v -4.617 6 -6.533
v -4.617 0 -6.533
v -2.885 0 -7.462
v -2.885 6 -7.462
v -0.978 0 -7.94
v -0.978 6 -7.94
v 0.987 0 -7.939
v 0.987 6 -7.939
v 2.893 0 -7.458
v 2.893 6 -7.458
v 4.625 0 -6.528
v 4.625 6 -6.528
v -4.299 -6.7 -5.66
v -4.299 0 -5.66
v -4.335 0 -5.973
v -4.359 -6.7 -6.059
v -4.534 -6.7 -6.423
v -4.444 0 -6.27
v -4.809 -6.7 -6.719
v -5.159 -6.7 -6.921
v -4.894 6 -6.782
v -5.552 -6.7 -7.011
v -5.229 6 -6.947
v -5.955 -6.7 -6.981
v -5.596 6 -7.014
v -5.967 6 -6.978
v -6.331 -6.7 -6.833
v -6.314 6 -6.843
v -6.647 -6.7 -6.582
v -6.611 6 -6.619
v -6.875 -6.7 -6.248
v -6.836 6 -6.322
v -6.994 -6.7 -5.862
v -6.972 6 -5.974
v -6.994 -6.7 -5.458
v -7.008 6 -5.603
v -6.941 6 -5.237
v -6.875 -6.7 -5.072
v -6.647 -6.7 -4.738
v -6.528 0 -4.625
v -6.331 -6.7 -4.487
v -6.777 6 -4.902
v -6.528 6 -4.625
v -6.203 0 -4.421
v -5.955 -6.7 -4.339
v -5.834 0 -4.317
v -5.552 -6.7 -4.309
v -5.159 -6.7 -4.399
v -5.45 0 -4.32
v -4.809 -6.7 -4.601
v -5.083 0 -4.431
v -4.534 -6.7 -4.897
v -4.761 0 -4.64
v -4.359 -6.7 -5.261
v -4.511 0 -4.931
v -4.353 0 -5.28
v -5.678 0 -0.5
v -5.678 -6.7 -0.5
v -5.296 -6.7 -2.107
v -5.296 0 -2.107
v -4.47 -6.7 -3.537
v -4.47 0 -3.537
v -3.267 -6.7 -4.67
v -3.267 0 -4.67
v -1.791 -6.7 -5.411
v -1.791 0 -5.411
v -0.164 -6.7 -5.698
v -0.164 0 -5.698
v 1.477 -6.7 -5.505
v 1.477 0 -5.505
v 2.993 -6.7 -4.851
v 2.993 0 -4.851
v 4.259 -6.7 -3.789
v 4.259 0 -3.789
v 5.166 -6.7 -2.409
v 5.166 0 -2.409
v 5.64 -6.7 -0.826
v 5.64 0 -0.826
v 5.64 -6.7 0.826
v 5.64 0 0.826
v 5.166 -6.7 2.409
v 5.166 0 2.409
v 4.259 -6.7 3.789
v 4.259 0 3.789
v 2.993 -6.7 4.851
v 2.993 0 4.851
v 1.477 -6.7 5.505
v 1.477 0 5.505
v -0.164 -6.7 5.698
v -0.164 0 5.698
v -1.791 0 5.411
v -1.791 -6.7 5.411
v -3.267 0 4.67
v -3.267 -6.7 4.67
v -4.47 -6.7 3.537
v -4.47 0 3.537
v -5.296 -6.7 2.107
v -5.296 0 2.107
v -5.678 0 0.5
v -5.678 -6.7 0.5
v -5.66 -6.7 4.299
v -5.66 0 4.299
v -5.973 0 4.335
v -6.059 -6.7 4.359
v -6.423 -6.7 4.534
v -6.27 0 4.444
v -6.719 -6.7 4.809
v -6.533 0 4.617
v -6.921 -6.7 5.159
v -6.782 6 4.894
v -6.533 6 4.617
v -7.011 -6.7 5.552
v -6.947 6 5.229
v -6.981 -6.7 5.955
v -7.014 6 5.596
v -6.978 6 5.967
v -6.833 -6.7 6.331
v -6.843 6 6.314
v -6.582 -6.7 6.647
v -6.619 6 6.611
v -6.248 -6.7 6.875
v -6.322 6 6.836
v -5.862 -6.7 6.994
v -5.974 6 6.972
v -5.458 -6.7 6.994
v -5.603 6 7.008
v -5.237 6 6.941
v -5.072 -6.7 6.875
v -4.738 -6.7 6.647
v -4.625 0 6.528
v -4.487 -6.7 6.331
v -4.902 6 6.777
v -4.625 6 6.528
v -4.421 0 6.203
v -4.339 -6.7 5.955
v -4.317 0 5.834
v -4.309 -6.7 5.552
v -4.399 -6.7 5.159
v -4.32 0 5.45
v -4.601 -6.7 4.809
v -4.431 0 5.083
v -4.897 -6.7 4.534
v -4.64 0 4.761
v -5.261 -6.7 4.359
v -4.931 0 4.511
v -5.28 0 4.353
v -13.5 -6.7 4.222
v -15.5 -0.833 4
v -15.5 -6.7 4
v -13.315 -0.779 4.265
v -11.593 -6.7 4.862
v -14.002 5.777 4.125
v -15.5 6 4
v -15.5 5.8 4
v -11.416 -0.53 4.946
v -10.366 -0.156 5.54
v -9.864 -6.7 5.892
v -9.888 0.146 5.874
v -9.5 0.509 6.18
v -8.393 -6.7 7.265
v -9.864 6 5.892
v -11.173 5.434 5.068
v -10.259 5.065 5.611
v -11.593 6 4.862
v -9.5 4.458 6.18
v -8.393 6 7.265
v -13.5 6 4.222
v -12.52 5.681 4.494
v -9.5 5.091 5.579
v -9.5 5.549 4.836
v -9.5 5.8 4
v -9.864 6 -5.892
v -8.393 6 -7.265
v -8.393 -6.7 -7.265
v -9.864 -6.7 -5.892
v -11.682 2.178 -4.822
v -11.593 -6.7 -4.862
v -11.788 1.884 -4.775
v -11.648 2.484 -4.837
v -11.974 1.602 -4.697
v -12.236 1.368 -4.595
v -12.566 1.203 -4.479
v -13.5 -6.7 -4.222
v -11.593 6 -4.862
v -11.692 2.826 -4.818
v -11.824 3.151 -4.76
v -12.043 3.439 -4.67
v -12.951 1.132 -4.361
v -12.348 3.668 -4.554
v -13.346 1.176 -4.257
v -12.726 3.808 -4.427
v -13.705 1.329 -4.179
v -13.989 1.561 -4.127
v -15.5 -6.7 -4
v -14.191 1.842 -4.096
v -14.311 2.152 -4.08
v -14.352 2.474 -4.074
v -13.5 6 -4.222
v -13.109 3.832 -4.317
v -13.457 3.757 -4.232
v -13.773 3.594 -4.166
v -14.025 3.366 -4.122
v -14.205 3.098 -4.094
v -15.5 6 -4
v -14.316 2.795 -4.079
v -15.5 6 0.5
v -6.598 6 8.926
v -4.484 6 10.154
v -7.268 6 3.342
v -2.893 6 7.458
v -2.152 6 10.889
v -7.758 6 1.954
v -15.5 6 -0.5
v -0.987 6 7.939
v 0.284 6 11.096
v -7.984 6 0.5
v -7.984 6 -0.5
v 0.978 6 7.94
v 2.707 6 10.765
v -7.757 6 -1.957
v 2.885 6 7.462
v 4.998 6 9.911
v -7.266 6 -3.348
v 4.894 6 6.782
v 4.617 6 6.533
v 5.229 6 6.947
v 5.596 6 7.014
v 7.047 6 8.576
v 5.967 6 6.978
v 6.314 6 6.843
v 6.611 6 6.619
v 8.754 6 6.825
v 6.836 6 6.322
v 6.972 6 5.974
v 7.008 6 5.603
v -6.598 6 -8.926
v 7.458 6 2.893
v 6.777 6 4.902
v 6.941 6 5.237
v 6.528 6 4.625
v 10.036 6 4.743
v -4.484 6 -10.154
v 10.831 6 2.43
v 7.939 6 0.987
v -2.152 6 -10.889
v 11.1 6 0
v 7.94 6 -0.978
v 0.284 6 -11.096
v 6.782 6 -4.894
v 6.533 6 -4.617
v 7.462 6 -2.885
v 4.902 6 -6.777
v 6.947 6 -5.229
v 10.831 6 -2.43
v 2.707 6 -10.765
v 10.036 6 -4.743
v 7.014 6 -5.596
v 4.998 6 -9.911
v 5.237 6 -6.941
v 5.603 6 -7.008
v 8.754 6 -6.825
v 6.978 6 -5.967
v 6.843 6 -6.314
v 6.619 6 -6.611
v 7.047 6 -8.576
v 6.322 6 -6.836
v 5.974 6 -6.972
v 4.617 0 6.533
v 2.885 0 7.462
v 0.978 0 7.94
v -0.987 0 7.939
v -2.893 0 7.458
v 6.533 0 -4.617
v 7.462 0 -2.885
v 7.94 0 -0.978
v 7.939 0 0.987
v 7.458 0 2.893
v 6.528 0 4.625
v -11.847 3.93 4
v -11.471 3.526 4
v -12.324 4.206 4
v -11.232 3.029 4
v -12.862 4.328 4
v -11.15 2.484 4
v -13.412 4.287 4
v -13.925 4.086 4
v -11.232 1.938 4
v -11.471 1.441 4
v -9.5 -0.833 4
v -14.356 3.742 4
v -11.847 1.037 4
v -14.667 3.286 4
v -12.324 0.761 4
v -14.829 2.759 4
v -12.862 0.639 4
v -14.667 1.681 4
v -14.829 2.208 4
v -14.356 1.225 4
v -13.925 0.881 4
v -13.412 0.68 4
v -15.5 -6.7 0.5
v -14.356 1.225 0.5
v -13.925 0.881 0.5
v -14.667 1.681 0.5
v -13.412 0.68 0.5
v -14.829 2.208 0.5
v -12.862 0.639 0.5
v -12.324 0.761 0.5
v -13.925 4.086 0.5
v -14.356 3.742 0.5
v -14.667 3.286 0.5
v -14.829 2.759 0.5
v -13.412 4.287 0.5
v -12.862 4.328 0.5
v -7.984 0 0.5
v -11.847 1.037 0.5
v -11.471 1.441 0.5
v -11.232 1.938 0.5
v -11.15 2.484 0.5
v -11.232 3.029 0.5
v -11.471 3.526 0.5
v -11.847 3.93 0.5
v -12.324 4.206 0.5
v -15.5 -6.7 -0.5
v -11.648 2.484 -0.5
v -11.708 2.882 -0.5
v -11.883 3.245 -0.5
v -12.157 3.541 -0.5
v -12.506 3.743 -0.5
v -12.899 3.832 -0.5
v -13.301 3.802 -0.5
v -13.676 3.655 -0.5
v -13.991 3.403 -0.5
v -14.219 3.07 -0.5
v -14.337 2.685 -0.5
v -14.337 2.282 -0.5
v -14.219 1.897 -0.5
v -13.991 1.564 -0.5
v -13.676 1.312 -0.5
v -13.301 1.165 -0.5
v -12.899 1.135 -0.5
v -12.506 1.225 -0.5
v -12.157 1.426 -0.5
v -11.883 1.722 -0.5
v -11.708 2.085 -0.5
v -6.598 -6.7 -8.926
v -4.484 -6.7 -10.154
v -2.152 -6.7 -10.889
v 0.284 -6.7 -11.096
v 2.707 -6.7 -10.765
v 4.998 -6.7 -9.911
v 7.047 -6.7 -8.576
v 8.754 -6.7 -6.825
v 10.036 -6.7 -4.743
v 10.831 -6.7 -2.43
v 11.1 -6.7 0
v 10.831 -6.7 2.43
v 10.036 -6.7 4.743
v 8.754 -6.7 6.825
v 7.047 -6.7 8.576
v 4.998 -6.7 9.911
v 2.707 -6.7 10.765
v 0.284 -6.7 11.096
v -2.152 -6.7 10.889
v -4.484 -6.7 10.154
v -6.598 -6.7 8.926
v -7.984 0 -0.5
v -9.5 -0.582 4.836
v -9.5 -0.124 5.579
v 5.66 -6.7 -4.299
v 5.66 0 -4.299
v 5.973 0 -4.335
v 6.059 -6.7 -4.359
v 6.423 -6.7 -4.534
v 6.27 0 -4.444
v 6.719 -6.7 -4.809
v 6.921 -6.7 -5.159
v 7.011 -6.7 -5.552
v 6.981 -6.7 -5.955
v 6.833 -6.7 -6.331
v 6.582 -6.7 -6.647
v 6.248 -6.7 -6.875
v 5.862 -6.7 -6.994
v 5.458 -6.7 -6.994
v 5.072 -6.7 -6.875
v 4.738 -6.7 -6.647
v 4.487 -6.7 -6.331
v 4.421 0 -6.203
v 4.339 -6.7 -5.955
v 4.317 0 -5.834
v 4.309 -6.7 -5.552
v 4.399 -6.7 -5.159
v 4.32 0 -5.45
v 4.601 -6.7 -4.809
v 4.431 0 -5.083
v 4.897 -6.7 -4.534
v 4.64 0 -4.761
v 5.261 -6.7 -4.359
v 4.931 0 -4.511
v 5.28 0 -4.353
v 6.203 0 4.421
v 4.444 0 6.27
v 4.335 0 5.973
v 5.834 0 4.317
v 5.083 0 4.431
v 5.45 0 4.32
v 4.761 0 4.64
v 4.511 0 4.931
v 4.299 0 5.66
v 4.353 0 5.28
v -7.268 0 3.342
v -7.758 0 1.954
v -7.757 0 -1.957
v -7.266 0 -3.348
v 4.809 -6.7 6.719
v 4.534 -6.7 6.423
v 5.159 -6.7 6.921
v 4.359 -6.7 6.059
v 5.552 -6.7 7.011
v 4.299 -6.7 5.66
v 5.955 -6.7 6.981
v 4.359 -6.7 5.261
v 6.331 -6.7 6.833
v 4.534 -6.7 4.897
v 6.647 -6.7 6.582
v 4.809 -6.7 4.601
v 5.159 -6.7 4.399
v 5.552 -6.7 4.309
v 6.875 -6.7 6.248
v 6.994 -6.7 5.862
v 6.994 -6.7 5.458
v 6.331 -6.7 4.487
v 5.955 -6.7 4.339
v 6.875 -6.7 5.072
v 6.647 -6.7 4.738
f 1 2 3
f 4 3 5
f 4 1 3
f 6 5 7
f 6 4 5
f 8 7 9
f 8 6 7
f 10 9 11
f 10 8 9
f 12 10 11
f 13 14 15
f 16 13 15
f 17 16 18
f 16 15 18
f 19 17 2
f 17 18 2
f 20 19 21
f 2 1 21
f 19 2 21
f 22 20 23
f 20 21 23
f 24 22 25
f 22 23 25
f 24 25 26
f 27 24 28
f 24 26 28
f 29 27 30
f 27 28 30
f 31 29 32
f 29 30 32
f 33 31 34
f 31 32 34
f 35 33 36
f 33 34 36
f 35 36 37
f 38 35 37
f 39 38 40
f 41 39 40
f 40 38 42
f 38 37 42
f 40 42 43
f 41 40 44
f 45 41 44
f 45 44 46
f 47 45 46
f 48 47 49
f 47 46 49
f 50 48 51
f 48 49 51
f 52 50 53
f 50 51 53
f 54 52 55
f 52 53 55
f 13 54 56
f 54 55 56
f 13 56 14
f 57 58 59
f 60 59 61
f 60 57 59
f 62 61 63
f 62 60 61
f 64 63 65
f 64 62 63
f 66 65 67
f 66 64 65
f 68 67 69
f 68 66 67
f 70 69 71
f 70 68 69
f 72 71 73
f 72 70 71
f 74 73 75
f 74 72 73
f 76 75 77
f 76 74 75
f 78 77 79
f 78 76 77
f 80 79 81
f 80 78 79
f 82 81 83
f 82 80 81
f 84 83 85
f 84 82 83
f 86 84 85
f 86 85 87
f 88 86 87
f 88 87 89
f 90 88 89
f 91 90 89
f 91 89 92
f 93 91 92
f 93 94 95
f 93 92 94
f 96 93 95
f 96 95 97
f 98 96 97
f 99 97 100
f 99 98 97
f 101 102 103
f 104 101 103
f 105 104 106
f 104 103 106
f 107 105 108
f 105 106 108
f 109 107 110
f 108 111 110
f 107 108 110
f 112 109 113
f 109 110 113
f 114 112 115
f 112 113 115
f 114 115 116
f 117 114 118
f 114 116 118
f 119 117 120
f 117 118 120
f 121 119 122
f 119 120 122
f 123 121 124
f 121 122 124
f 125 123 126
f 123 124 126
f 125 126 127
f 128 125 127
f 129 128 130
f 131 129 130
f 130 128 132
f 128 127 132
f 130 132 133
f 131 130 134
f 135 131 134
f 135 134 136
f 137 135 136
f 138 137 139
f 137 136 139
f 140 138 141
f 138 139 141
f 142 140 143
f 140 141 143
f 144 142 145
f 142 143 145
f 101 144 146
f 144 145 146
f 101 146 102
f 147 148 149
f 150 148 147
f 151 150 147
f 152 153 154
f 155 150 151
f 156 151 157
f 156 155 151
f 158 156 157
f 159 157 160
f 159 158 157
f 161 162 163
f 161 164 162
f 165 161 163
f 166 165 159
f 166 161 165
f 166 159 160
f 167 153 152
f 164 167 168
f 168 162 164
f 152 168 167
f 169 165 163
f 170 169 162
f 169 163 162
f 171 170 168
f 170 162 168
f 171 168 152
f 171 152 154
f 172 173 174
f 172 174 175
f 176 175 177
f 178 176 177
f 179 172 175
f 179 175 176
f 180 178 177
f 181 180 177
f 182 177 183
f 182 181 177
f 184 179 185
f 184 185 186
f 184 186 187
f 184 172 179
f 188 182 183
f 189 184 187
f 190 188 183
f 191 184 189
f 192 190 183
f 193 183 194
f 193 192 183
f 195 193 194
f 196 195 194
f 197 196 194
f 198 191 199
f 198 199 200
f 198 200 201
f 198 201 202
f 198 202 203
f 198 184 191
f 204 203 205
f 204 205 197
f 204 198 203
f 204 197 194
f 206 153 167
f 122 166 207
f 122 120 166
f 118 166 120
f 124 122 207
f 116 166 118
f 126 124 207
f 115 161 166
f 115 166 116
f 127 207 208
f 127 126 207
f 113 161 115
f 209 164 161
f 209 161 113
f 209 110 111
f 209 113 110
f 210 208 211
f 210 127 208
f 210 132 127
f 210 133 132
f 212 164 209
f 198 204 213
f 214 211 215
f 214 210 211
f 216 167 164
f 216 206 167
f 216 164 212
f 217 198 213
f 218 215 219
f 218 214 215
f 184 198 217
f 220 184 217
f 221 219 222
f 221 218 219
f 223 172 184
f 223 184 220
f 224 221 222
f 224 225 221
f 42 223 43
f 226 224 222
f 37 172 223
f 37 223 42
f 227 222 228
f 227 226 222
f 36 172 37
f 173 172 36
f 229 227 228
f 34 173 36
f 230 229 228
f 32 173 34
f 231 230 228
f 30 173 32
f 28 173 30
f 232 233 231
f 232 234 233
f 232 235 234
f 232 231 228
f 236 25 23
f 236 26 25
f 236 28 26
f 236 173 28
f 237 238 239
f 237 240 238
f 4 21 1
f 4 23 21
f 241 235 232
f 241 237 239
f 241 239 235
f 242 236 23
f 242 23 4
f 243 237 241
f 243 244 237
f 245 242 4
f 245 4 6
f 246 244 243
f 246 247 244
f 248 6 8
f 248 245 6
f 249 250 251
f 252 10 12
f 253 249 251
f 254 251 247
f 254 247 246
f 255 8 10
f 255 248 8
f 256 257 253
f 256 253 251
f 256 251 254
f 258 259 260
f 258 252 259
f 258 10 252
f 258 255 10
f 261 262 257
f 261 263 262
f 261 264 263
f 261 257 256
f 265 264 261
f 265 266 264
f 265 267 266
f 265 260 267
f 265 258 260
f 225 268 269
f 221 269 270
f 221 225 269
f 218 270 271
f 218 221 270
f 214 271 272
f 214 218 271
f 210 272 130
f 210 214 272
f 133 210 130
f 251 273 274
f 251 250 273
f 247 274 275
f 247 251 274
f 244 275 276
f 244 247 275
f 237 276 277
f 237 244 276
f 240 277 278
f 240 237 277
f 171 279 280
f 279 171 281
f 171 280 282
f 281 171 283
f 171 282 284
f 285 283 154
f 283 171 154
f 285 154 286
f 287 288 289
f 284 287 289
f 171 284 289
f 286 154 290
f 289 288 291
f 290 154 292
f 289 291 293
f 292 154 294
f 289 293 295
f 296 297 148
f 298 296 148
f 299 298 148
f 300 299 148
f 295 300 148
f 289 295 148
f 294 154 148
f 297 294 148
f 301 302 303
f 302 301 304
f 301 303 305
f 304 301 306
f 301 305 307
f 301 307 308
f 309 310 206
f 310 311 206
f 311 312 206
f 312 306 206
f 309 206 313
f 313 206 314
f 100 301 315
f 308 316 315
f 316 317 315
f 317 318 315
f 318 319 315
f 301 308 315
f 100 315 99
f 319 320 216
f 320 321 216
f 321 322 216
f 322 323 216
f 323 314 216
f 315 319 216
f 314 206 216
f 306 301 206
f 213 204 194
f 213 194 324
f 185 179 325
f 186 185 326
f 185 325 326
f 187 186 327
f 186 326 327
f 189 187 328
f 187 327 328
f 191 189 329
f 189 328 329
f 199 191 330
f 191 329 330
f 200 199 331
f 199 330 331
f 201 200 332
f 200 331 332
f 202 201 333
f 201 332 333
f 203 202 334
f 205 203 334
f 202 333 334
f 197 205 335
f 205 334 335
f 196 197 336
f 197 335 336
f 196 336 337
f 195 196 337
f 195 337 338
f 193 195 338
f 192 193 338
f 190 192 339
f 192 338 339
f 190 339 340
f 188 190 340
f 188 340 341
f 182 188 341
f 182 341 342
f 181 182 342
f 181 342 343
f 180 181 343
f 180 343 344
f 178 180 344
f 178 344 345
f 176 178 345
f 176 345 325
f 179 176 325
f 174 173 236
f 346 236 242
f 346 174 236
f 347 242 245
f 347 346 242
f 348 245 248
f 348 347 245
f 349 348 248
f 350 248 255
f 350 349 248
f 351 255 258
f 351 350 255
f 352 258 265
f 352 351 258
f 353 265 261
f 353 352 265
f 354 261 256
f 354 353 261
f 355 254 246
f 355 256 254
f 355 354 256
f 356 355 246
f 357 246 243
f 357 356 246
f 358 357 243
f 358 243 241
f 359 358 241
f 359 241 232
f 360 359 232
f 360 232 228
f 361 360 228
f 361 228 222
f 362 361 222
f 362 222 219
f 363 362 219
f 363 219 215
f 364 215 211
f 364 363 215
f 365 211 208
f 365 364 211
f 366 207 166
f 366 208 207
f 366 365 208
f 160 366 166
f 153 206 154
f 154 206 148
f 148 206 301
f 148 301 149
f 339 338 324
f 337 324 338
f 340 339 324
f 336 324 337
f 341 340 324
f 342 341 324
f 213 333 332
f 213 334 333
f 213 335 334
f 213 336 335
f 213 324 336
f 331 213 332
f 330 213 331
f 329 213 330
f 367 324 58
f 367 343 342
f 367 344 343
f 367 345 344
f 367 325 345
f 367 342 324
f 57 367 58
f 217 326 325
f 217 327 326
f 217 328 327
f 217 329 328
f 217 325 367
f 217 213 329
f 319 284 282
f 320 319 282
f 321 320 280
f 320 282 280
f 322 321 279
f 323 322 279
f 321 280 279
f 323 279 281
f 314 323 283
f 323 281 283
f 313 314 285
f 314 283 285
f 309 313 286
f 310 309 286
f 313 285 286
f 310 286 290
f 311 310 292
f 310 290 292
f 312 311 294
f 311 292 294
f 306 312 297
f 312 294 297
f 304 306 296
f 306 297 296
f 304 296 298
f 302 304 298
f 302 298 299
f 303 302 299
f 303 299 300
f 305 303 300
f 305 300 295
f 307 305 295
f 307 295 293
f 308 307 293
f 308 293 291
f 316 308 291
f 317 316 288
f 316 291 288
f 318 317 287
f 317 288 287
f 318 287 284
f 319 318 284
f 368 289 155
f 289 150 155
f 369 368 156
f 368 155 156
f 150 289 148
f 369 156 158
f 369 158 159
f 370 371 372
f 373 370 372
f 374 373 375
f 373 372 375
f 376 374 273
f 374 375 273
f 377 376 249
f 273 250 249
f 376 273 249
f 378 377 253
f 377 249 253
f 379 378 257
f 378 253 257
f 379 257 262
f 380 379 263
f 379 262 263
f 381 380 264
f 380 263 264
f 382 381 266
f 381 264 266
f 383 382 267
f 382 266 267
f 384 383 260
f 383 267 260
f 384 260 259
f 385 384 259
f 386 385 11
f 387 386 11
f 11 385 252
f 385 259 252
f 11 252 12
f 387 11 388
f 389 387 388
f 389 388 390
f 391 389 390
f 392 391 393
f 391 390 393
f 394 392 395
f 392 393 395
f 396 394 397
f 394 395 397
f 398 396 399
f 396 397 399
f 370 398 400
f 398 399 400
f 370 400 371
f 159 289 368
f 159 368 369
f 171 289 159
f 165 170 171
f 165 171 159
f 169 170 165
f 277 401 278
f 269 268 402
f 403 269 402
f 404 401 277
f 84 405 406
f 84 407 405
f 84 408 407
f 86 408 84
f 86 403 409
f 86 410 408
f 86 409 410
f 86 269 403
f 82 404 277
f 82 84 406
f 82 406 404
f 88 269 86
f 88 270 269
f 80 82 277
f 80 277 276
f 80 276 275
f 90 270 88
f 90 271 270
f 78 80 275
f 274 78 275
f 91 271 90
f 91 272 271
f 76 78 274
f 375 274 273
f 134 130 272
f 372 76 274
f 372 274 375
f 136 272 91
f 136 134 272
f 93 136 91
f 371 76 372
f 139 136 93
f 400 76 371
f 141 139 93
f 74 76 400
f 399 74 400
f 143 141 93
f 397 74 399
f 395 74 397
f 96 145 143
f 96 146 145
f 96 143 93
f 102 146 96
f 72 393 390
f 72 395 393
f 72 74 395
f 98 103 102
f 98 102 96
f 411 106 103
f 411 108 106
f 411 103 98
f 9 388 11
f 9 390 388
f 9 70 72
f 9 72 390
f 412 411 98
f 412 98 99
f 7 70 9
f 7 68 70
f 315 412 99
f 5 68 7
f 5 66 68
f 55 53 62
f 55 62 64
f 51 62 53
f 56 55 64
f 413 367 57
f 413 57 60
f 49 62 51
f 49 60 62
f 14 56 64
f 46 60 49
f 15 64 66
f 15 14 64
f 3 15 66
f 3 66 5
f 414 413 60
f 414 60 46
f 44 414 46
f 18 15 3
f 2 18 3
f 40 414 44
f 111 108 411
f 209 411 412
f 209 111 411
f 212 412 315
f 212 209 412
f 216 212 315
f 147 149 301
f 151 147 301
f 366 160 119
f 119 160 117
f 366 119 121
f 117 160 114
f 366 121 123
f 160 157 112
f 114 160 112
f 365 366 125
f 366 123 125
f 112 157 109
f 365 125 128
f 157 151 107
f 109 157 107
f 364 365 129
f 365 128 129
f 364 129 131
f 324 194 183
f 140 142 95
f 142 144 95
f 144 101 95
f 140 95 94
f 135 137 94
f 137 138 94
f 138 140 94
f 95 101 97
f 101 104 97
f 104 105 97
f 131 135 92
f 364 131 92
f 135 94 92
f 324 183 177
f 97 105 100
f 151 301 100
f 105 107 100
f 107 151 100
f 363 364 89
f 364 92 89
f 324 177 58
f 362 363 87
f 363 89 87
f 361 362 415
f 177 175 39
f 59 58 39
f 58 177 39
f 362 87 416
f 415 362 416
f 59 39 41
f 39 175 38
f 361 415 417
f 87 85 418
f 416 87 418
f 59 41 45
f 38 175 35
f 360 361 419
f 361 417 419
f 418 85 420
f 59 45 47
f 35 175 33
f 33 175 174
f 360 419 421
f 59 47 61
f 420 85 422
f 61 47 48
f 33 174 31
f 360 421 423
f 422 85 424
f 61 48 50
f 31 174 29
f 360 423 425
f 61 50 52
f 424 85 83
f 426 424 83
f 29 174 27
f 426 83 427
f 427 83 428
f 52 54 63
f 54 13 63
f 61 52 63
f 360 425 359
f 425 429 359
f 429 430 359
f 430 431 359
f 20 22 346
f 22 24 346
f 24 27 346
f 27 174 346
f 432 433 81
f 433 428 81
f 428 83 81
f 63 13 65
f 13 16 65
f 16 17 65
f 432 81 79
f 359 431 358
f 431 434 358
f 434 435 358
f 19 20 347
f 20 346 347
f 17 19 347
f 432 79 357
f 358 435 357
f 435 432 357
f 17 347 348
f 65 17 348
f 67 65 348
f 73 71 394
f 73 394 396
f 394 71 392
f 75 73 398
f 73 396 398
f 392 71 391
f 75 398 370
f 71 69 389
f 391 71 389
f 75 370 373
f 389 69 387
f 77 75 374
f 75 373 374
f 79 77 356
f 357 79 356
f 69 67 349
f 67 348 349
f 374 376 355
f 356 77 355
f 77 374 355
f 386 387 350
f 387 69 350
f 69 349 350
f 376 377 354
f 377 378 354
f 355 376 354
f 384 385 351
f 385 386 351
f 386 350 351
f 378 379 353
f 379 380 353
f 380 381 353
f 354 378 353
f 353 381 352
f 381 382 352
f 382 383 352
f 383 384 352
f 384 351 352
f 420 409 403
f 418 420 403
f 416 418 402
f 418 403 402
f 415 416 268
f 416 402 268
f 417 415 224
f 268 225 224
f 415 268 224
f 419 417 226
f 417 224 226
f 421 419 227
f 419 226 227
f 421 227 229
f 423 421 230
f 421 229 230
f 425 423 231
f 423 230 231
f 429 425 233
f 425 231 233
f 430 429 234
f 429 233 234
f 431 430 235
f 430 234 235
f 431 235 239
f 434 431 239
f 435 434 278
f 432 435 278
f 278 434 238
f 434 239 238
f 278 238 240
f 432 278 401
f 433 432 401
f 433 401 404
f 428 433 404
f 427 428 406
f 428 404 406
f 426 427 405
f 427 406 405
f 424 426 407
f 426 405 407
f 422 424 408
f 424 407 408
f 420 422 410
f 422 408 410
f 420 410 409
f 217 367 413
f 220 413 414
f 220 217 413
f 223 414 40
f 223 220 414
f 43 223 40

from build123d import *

# Parameters (mm, degrees)
SKETCH2_R          = 1.355
CUT_EXTRUDE1_DEPTH = 12.7
CIRPATTERN1_COUNT  = 4
SKETCH3_W          = 5.14577381
SKETCH3_H          = 8
EXTRUDE1_DEPTH     = 12.7
FILLET1_R          = 9.448
CUT_EXTRUDE2_REACH = 24.907
SKETCH4_W          = 10
SKETCH4_H          = 1
CUT_EXTRUDE3_DEPTH = 6
SKETCH6_R          = 1.85
CUT_EXTRUDE4_DEPTH = 3.5
CUT_EXTRUDE5_REACH = 22.487
SKETCH7_R          = 1.3525


with BuildPart() as part:
    # Sketch1 → Revolve1 (revolve)
    with BuildSketch(Plane.XY, mode=Mode.PRIVATE) as revolve1_sk:
        Polygon((5.7, 0), (8, 0), (8, 6), (11.1, 6), (11.1, -6.7), (5.7, -6.7), align=None)
    revolve(revolve1_sk.sketch.rotate(Axis((0, 9.388395062, 0), (0, -1, 0)), 90), axis=Axis((0, 9.388395062, 0), (0, -1, 0)))

    # Sketch2 → Cut-Extrude1 (cut)
    with BuildSketch(Plane(origin=(0, 6, 0), x_dir=(1, 0, 0), z_dir=(0, 1, 0))):
        with Locations(Location((5.66, 5.653706749, 0), (0, 0, 270))):
            Circle(SKETCH2_R)
    cut_extrude1 = extrude(amount=-CUT_EXTRUDE1_DEPTH, mode=Mode.SUBTRACT)

    # CirPattern1: Cut-Extrude1 ×4 about axis
    cirpattern1_axis = Axis((0, 0, 0), (0, 1, 0))
    for i in range(1, CIRPATTERN1_COUNT):
        add(cut_extrude1.rotate(cirpattern1_axis, i * 360 / CIRPATTERN1_COUNT), mode=Mode.SUBTRACT)

    # Sketch3 → Extrude1 (add)
    with BuildSketch(Plane(origin=(0, 6, 0), x_dir=(1, 0, 0), z_dir=(0, 1, 0))):
        with Locations((-12.927113095, 0)):
            Rectangle(SKETCH3_W, SKETCH3_H)
    extrude(amount=-EXTRUDE1_DEPTH)

    # Fillet1
    # the kernel refuses this fillet: 9.448 mm, written as the material it adds along each edge
    with BuildSketch(Plane(origin=(-10.35422619, 6, -4), x_dir=(-1, 0, 0), z_dir=(0, -1, 0))) as fillet1_piece_1_section:
        with BuildLine():
            CenterArc((5.181912326, 9.448), FILLET1_R, 220.879291984, 49.120708016)
            ThreePointArc((-1.961626544, 3.264590228), (-0.839750005, 1.717057191), (0, 0))
            Line((0, 0), (5.181912326, 0))
        make_face()
    fillet1_piece_1 = extrude(amount=12.7, mode=Mode.PRIVATE)
    fillet1_piece_1 = split(fillet1_piece_1, bisect_by=Plane(origin=(-15.5, -0.35, -4.693597662), z_dir=(1, 0, 0)), keep=Keep.TOP, mode=Mode.PRIVATE)
    add(fillet1_piece_1)
    with BuildSketch(Plane(origin=(-10.35422619, 6, 4), x_dir=(-1, 0, 0), z_dir=(0, -1, 0))) as fillet1_piece_2_section:
        with BuildLine():
            CenterArc((5.181912326, -9.448), FILLET1_R, 90, 49.120708016)
            ThreePointArc((-1.961626544, -3.264590228), (-0.839750005, -1.717057191), (0, 0))
            Line((0, 0), (5.181912326, 0))
        make_face()
    fillet1_piece_2 = extrude(amount=12.7, mode=Mode.PRIVATE)
    fillet1_piece_2 = split(fillet1_piece_2, bisect_by=Plane(origin=(-15.5, -0.35, 4.693597662), z_dir=(1, 0, 0)), keep=Keep.TOP, mode=Mode.PRIVATE)
    add(fillet1_piece_2)

    # Cut-Extrude2: up to this face of the body (flat: up to its plane)
    cut_extrude2_end = Plane(part.part.faces().sort_by_distance((-15.153532108, -6.7, 0))[0])
    # Sketch4 → Cut-Extrude2 (cut, up to the picked face)
    with BuildSketch(Plane(origin=(0, 6, 0), x_dir=(1, 0, 0), z_dir=(0, 1, 0)), mode=Mode.PRIVATE) as cut_extrude2_sk1:
        with Locations((-10.5, 0)):
            Rectangle(SKETCH4_W, SKETCH4_H)
    cut_extrude2_tool1 = split(extrude(cut_extrude2_sk1.sketch, amount=-CUT_EXTRUDE2_REACH, mode=Mode.PRIVATE), bisect_by=cut_extrude2_end, keep=Keep.BOTH, mode=Mode.PRIVATE)
    add(cut_extrude2_tool1.solids().sort_by(Axis((-10.5, 6, 0), (0, -1, 0)))[0], mode=Mode.SUBTRACT)

    # Sketch5 → Cut-Extrude3 (cut)
    with BuildSketch(Plane.ZY.offset(15.5)):
        with BuildLine():
            Line((4, 5.8), (4, -0.83286788))
            ThreePointArc((4, -0.83286788), (6.82068013, 2.48356606), (4, 5.8))
        make_face()
    extrude(amount=-CUT_EXTRUDE3_DEPTH, mode=Mode.SUBTRACT)

    # Sketch6 → Cut-Extrude4 (cut)
    with BuildSketch(Plane.XY.offset(4)):
        with Locations((-13, 2.48356606)):
            Circle(SKETCH6_R)
    extrude(amount=-CUT_EXTRUDE4_DEPTH, mode=Mode.SUBTRACT)

    # Sketch7 → Cut-Extrude5 (cut, up to next)
    with BuildSketch(Plane.XY.offset(-0.5), mode=Mode.PRIVATE) as cut_extrude5_sk1:
        with Locations((-13, 2.48356606)):
            Circle(SKETCH7_R)
    cut_extrude5_tool1 = extrude(cut_extrude5_sk1.sketch, amount=-CUT_EXTRUDE5_REACH, mode=Mode.PRIVATE) & part.part
    add(cut_extrude5_tool1.solids().sort_by_distance((-13, 2.483566, -0.5))[0], mode=Mode.SUBTRACT)


solid = part.part
